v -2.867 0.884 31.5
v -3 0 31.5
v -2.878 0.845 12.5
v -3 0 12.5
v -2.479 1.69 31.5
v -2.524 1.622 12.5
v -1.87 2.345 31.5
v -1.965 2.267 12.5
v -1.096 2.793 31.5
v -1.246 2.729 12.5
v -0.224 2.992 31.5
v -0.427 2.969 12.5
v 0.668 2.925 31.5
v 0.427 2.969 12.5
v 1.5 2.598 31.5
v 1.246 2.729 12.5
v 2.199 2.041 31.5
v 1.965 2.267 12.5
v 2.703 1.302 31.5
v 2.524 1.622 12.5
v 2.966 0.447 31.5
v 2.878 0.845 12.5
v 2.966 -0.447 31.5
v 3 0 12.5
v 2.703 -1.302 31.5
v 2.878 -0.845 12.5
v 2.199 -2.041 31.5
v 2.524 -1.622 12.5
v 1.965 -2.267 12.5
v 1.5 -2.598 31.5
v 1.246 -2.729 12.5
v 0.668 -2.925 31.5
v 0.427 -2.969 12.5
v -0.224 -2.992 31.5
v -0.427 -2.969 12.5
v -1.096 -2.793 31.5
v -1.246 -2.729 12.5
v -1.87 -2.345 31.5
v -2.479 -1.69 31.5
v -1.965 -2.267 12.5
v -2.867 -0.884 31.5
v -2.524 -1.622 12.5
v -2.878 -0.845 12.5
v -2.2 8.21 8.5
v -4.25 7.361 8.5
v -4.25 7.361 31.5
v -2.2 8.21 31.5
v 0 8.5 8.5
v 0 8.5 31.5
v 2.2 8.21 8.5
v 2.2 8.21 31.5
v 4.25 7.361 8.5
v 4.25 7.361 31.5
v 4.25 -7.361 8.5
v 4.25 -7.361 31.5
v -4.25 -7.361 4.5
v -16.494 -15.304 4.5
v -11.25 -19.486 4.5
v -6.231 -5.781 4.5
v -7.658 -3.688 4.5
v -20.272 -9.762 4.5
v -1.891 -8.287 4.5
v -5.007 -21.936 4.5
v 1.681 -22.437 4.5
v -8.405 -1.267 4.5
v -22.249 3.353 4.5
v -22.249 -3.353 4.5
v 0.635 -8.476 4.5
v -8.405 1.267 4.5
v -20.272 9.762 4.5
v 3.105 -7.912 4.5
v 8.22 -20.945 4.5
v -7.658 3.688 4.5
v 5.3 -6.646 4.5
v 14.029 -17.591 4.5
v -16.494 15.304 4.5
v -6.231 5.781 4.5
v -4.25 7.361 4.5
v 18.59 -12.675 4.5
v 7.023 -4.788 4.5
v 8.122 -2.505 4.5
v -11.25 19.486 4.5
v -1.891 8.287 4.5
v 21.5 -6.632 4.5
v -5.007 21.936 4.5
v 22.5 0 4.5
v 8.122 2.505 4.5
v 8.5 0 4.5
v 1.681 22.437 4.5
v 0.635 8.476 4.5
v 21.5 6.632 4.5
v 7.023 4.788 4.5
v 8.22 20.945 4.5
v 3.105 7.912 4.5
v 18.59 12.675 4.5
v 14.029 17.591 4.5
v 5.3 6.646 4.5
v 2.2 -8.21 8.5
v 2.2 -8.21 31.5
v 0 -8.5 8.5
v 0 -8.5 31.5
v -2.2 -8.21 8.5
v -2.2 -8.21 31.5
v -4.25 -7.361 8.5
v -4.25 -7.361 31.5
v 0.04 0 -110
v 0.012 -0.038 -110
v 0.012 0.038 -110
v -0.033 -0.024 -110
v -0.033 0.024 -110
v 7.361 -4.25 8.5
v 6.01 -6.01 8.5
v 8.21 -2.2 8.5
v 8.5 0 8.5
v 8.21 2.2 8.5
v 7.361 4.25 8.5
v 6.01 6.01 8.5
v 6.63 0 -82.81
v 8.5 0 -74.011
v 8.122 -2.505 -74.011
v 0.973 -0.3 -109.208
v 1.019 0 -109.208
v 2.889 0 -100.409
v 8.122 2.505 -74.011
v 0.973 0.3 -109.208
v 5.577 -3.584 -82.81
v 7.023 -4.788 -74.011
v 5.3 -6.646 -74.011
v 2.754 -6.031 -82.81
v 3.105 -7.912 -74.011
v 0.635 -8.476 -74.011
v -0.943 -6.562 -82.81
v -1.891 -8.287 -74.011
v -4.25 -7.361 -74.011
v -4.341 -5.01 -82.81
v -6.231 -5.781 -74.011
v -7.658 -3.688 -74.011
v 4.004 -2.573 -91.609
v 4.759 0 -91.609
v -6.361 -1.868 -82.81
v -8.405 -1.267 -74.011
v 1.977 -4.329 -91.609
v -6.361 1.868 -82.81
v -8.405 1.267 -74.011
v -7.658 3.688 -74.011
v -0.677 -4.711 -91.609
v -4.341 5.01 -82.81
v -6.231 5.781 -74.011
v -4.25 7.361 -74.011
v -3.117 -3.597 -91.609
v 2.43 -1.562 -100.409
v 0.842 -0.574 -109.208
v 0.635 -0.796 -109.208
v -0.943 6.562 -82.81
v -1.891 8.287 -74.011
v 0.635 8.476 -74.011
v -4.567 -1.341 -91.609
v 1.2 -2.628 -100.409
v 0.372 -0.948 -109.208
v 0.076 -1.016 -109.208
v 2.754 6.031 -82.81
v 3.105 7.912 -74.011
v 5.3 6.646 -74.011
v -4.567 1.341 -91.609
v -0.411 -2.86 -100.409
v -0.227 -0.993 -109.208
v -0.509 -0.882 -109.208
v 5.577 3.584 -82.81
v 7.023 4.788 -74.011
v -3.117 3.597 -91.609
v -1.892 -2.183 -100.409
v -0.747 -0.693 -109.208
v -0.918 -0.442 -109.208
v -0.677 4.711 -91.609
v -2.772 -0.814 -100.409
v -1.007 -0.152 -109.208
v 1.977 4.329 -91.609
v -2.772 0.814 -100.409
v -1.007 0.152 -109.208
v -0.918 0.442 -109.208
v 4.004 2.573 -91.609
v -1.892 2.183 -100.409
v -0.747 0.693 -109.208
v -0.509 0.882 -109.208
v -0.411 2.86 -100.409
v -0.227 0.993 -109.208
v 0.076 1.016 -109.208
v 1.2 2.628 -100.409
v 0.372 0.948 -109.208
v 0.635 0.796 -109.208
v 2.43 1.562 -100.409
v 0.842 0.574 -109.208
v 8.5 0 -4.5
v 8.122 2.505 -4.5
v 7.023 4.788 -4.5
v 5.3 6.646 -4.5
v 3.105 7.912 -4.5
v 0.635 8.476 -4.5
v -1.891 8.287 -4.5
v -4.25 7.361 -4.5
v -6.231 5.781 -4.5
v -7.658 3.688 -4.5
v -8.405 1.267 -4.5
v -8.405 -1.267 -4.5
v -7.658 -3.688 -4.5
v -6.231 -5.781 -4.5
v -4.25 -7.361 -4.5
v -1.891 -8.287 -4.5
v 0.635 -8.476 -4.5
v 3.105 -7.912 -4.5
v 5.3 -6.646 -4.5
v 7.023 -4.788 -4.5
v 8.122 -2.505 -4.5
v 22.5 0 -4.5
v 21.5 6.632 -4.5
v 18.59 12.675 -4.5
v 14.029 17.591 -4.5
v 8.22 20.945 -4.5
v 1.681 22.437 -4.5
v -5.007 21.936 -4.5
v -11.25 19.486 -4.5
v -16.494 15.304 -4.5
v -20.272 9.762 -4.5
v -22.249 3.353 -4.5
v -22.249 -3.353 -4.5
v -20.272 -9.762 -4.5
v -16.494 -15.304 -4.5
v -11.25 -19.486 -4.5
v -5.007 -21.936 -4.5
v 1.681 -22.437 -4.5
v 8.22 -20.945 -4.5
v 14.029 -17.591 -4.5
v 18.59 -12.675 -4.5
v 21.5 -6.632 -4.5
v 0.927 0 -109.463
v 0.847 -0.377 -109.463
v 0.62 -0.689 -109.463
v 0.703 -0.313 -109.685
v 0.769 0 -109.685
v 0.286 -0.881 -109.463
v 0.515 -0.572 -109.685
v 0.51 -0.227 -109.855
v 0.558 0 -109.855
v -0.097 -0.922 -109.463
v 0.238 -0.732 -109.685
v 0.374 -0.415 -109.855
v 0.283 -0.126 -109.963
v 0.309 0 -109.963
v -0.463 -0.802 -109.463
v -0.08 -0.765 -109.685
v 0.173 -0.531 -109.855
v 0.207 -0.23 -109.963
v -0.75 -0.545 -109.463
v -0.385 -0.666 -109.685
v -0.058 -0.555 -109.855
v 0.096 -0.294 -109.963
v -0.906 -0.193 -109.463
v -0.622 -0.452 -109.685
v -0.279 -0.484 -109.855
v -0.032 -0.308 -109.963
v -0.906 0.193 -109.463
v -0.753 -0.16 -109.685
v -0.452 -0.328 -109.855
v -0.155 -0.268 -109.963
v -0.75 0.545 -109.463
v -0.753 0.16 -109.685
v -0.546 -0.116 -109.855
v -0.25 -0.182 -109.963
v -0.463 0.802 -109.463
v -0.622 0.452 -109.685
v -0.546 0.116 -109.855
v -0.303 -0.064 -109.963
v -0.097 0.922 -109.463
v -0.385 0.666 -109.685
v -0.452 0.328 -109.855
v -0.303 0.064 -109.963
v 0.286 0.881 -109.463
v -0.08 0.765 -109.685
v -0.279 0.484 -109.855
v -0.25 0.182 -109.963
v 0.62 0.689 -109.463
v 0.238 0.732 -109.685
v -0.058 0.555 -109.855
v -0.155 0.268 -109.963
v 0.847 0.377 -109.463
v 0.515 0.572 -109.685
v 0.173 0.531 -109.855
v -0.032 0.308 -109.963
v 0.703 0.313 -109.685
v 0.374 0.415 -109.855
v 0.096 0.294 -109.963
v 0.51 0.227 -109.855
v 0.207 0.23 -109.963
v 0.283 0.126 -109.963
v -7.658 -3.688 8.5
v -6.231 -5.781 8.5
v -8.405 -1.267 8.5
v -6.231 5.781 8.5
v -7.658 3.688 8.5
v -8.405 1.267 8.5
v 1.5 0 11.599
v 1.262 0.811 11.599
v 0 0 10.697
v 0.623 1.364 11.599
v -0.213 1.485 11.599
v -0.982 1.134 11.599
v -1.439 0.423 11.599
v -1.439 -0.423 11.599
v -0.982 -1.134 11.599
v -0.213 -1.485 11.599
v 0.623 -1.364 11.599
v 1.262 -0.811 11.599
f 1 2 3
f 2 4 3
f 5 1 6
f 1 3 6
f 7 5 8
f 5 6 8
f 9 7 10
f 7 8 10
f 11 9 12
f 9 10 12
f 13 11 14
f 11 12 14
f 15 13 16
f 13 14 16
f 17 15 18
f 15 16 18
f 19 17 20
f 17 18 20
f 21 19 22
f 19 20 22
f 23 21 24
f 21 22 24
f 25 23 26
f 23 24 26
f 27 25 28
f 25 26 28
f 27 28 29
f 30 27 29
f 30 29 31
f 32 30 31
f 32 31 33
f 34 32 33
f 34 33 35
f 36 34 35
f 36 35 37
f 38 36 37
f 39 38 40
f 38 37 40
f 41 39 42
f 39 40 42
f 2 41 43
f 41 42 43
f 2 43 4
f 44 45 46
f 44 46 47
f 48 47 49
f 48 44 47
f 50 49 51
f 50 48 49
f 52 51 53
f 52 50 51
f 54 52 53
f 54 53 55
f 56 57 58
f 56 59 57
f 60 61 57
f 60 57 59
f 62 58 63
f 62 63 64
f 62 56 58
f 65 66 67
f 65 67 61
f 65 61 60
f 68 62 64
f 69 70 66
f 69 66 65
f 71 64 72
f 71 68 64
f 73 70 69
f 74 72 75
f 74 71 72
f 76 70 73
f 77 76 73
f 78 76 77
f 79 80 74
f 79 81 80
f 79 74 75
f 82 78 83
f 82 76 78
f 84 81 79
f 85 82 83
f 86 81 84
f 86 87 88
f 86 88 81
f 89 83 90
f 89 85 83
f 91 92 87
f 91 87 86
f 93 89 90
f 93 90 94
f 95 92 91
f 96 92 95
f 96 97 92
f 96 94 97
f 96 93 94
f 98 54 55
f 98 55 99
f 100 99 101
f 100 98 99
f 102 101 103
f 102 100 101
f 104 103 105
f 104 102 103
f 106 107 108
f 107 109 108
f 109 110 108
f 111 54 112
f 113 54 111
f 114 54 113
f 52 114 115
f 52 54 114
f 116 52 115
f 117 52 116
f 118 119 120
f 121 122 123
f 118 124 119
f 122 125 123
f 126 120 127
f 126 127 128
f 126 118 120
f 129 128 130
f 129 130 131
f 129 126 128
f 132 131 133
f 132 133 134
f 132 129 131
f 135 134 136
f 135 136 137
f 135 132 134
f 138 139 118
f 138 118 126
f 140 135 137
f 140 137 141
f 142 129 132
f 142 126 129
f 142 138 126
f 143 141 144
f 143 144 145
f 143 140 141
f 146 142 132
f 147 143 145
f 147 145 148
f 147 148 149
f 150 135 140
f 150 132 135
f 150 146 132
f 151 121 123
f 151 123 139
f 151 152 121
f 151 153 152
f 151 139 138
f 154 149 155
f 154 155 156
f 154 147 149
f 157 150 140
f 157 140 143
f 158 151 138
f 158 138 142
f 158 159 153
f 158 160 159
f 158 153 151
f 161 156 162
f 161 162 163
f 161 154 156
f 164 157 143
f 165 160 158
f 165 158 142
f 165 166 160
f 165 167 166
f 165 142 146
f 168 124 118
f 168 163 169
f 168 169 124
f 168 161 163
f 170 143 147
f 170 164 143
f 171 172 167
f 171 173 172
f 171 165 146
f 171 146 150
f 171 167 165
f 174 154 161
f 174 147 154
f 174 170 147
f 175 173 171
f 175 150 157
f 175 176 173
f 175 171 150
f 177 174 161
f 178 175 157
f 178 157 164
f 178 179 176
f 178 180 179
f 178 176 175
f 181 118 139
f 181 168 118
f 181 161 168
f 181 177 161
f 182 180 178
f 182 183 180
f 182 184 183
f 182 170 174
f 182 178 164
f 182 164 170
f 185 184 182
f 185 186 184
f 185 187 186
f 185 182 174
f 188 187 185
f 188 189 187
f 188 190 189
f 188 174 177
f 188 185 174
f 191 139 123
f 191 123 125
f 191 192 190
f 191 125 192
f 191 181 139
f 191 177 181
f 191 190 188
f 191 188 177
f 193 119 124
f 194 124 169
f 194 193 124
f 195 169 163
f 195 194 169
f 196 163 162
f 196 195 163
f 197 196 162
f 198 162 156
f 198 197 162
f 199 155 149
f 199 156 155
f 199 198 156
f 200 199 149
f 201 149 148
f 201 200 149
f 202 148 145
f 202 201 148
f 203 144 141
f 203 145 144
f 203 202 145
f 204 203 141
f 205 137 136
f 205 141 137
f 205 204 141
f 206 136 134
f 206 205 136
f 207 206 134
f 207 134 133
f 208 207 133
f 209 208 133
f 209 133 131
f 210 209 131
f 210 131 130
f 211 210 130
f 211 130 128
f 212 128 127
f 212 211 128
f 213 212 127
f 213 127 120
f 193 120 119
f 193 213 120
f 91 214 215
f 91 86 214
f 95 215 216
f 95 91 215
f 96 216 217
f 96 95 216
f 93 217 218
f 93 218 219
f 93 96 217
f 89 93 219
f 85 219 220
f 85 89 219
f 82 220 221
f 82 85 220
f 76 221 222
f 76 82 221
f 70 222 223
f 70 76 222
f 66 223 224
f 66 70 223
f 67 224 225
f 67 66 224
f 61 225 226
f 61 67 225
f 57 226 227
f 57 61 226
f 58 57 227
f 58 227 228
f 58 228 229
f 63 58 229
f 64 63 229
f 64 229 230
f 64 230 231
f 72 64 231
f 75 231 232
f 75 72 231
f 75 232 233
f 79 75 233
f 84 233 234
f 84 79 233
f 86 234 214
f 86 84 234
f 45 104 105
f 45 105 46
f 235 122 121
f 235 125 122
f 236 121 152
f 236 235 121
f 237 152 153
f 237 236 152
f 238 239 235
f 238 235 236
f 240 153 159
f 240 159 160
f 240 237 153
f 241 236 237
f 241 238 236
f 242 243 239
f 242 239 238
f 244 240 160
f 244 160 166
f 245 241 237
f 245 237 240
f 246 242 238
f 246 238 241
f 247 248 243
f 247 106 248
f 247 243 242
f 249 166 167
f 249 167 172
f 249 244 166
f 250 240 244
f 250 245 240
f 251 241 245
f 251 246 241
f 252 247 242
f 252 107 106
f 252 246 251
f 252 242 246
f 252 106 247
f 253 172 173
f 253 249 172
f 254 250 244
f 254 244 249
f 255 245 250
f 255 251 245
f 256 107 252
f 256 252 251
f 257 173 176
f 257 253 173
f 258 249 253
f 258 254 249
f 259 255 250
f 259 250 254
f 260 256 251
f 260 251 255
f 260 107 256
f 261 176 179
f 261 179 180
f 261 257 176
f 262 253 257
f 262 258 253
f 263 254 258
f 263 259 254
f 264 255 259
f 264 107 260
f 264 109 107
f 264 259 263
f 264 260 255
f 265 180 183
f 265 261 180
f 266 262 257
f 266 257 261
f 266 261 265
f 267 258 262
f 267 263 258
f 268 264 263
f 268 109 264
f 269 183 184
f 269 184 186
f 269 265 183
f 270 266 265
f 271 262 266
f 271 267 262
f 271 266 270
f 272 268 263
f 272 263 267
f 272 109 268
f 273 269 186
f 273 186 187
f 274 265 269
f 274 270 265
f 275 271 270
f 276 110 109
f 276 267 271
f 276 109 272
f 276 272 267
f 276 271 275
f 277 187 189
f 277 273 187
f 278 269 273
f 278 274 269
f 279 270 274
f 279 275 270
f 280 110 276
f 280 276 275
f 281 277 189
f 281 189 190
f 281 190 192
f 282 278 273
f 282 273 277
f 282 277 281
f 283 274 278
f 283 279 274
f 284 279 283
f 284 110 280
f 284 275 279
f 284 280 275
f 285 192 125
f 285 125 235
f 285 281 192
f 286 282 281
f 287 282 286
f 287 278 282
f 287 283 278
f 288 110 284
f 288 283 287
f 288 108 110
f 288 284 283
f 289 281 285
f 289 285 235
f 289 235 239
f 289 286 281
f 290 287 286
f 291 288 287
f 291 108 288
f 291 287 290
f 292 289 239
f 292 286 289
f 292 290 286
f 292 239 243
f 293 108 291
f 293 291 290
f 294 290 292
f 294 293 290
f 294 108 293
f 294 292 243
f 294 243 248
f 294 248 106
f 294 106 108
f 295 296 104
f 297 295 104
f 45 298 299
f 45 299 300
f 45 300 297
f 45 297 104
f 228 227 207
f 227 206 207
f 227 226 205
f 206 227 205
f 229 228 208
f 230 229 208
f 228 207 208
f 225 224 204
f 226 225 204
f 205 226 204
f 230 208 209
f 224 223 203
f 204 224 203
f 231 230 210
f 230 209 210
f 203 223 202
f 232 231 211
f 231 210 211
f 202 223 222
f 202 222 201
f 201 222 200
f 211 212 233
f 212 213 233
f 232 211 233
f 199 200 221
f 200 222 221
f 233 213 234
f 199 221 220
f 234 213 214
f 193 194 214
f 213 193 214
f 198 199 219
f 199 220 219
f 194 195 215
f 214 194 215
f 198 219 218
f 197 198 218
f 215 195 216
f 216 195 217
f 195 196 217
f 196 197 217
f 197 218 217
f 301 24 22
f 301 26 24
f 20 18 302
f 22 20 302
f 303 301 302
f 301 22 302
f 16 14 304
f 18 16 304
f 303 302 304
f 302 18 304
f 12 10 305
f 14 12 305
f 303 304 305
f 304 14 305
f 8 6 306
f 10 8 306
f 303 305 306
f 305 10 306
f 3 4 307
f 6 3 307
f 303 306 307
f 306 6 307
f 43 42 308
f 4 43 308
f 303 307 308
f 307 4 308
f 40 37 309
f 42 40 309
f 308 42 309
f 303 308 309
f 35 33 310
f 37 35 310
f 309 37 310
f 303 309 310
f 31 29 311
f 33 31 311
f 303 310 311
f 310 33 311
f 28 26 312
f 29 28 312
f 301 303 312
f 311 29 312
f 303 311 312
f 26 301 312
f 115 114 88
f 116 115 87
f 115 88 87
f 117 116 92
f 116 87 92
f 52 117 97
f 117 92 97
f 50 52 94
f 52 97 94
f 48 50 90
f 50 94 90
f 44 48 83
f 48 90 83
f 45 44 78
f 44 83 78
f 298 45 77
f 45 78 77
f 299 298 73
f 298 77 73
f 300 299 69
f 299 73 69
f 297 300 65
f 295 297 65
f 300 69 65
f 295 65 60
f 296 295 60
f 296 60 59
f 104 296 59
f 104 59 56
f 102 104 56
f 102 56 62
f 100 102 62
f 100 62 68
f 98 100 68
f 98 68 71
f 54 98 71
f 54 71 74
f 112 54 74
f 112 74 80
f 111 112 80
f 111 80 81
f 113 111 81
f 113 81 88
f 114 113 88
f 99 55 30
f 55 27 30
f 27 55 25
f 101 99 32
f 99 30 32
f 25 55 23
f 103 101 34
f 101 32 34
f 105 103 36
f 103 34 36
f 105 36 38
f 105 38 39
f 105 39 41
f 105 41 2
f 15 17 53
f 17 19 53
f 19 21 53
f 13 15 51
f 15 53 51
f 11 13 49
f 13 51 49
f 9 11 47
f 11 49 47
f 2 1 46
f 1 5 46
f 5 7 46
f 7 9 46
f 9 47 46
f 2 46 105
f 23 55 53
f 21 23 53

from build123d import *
from build123d.topology import SkipClean

# Parameters (mm, degrees)
SKETCH1_R                 = 8.5
BASE_EXTRUDE_DEPTH        = 110
SKETCH1_4_R               = 22.5
FRONT_CAP_DEPTH           = 4.5
END_BEVEL_FILLET_R        = 1
SKETCH7_R                 = 8.5
FRONT_KNOB_DEPTH          = 4
FRONT_KNOB_SLOT_DEPTH     = 23
M7X1_0_TAPPED_HOLE1_D     = 6
M7X1_0_TAPPED_HOLE1_DEPTH = 19
M7X1_0_TAPPED_HOLE1_TIP   = 1.802581857


with BuildPart() as part:
    # Sketch1 → Base Extrude (new body)
    with BuildSketch(Plane.XY):
        Circle(SKETCH1_R)
    extrude(amount=-BASE_EXTRUDE_DEPTH)

    # Sketch1_4 → Front Cap (add, symmetric)
    with BuildSketch(Plane.XY):
        Circle(SKETCH1_4_R)
    extrude(amount=FRONT_CAP_DEPTH, both=True)

    # Sketch3 → End Bevel (revolve, cut)
    with BuildSketch(Plane(origin=(0, 0, 0), x_dir=(0, 0, -1), z_dir=(1, 0, 0)), mode=Mode.PRIVATE) as end_bevel_sk:
        Polygon((74.010644069, 8.5), (114, 0), (124.010644069, 0), (124.010644069, 25), (74.010644069, 25), align=None)
    revolve(end_bevel_sk.sketch.rotate(Axis((0, 0, -92.509493434), (0, 0, -1)), 90), axis=Axis((0, 0, -92.509493434), (0, 0, -1)), mode=Mode.SUBTRACT)  # turned: the seam where the file's is

    # End Bevel Fillet
    end_bevel_fillet_edges = [part.edges().sort_by_distance(p)[0] for p in [
        (-0.850226247, 0, -110),
    ]]
    fillet(end_bevel_fillet_edges, radius=END_BEVEL_FILLET_R)

    # Sketch7 → Front Knob (add)
    with BuildSketch(Plane.XY.offset(4.5)):
        Circle(SKETCH7_R)
    extrude(amount=FRONT_KNOB_DEPTH)

    # Sketch6 → Front Knob Slot (add)
    with SkipClean():  # keep this step's faces unmerged: merging them makes the solid invalid here
        with BuildSketch(Plane.XY.offset(8.5)):
            with BuildLine():
                Line((-4.25, -7.361215932), (-4.25, 7.361215932))
                ThreePointArc((-4.25, 7.361215932), (0, 8.5), (4.25, 7.361215932))
                Line((4.25, 7.361215932), (4.25, -7.361215932))
                ThreePointArc((4.25, -7.361215932), (0, -8.5), (-4.25, -7.361215932))
            make_face()
        extrude(amount=FRONT_KNOB_SLOT_DEPTH)

    # M7x1.0 Tapped Hole1
    with Locations(Plane.XY.offset(31.5)):
        with Locations((0, 0)):
            Hole(M7X1_0_TAPPED_HOLE1_D / 2, depth=M7X1_0_TAPPED_HOLE1_DEPTH)
            with Locations((0, 0, -(M7X1_0_TAPPED_HOLE1_DEPTH + M7X1_0_TAPPED_HOLE1_TIP / 2))):  # 118° drill point
                Cone(0, M7X1_0_TAPPED_HOLE1_D / 2, M7X1_0_TAPPED_HOLE1_TIP, mode=Mode.SUBTRACT)


solid = part.part
